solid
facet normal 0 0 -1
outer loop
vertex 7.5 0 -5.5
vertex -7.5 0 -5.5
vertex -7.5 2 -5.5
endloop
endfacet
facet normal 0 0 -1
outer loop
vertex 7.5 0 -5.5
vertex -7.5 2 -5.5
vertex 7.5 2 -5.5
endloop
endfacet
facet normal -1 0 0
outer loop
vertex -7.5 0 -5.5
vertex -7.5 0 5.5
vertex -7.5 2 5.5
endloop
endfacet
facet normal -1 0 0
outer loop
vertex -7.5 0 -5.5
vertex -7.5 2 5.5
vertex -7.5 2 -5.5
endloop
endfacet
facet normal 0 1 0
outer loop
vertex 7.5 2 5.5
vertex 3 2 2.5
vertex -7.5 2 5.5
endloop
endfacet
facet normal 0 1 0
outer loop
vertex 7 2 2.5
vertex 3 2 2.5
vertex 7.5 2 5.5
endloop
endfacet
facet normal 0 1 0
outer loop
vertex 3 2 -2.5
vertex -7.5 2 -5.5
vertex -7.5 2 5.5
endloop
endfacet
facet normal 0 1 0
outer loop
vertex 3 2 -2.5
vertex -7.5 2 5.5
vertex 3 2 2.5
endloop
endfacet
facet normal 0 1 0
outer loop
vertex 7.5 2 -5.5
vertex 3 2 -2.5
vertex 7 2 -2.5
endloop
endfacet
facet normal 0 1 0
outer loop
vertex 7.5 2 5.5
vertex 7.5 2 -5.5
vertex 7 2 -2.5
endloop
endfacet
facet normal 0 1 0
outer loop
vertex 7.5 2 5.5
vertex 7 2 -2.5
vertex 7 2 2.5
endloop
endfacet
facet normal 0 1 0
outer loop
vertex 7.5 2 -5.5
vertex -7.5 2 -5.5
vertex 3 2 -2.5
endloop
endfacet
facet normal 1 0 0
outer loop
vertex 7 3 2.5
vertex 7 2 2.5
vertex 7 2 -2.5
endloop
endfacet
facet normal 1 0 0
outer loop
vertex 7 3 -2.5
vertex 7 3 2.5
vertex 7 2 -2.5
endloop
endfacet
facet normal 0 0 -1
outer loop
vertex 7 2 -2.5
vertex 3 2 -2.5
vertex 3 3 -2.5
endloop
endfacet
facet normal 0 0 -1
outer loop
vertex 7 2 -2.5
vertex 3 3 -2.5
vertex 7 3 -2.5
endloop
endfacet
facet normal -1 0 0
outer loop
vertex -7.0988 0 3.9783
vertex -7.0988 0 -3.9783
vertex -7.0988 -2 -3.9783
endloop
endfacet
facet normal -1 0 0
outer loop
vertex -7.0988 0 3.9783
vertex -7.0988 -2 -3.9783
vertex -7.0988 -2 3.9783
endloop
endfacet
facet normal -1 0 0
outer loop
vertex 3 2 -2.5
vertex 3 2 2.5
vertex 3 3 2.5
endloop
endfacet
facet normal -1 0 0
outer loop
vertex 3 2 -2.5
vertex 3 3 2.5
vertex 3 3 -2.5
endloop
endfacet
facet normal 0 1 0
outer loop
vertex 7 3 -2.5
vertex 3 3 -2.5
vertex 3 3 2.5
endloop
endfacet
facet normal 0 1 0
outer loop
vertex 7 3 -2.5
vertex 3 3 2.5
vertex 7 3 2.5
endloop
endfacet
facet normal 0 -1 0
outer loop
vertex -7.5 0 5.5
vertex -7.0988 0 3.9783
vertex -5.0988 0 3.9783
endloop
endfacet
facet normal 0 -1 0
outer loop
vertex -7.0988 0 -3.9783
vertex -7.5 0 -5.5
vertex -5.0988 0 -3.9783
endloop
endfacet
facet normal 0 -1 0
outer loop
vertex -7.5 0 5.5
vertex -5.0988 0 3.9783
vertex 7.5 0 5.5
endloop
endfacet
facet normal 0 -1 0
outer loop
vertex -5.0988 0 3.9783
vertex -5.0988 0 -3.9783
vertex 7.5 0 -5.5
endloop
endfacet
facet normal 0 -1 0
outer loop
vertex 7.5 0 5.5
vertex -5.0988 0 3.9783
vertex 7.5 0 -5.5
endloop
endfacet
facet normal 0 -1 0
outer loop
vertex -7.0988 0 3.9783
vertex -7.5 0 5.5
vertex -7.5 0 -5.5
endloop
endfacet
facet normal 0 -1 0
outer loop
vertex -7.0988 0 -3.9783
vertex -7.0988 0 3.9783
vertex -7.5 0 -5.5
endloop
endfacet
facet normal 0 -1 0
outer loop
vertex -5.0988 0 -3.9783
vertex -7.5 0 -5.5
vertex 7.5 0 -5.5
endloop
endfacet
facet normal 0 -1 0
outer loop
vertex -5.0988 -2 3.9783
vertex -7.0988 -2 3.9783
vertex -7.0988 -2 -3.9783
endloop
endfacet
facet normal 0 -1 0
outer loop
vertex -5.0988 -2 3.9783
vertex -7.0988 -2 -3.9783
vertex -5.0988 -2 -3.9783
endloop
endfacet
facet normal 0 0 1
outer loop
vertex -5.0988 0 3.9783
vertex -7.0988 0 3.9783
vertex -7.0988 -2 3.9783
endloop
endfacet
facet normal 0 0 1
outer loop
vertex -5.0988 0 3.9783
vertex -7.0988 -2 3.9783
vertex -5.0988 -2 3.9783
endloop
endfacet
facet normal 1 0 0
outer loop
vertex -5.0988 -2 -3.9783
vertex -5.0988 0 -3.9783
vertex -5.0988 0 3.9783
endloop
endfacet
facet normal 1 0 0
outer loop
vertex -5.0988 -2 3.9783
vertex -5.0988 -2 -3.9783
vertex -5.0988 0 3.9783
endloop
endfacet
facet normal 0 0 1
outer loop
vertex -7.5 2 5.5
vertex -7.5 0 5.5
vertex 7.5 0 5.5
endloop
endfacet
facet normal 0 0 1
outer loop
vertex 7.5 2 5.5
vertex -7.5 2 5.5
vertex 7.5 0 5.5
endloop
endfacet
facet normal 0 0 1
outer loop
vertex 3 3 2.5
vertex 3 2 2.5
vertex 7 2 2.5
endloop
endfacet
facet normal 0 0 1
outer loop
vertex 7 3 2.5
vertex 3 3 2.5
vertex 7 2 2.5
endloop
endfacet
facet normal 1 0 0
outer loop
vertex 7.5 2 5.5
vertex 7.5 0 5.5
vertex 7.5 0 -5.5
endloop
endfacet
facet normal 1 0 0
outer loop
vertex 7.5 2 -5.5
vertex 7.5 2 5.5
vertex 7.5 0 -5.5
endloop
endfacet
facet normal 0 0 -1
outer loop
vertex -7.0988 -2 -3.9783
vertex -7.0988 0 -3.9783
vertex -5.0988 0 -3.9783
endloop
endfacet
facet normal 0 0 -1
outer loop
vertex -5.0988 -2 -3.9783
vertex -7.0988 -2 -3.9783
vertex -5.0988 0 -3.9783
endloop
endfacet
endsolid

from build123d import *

# Parameters (mm, degrees)
SKETCH_1_W      = 15
SKETCH_1_H      = 11
EXTRUDE_1_DEPTH = 2
SKETCH_2_W      = 4
SKETCH_2_H      = 5
EXTRUDE_2_DEPTH = 1
SKETCH_3_W      = 2
SKETCH_3_H      = 7.956602162
EXTRUDE_3_DEPTH = 2


with BuildPart() as part:
    # 스케치1 → 보스-돌출1 (new body)
    with BuildSketch(Plane(origin=(0, 0, 0), x_dir=(1, 0, 0), z_dir=(0, 1, 0))):
        Rectangle(SKETCH_1_W, SKETCH_1_H)
    extrude(amount=EXTRUDE_1_DEPTH)

    # 스케치2 → 보스-돌출2 (add)
    with BuildSketch(Plane(origin=(0, 2, 0), x_dir=(1, 0, 0), z_dir=(0, 1, 0))):
        with Locations((5, 0)):
            Rectangle(SKETCH_2_W, SKETCH_2_H)
    extrude(amount=EXTRUDE_2_DEPTH)

    # 스케치3 → 보스-돌출3 (add)
    with BuildSketch(Plane.XZ):
        with Locations((-6.098780992, 0)):
            Rectangle(SKETCH_3_W, SKETCH_3_H)
    extrude(amount=EXTRUDE_3_DEPTH)


solid = part.part
